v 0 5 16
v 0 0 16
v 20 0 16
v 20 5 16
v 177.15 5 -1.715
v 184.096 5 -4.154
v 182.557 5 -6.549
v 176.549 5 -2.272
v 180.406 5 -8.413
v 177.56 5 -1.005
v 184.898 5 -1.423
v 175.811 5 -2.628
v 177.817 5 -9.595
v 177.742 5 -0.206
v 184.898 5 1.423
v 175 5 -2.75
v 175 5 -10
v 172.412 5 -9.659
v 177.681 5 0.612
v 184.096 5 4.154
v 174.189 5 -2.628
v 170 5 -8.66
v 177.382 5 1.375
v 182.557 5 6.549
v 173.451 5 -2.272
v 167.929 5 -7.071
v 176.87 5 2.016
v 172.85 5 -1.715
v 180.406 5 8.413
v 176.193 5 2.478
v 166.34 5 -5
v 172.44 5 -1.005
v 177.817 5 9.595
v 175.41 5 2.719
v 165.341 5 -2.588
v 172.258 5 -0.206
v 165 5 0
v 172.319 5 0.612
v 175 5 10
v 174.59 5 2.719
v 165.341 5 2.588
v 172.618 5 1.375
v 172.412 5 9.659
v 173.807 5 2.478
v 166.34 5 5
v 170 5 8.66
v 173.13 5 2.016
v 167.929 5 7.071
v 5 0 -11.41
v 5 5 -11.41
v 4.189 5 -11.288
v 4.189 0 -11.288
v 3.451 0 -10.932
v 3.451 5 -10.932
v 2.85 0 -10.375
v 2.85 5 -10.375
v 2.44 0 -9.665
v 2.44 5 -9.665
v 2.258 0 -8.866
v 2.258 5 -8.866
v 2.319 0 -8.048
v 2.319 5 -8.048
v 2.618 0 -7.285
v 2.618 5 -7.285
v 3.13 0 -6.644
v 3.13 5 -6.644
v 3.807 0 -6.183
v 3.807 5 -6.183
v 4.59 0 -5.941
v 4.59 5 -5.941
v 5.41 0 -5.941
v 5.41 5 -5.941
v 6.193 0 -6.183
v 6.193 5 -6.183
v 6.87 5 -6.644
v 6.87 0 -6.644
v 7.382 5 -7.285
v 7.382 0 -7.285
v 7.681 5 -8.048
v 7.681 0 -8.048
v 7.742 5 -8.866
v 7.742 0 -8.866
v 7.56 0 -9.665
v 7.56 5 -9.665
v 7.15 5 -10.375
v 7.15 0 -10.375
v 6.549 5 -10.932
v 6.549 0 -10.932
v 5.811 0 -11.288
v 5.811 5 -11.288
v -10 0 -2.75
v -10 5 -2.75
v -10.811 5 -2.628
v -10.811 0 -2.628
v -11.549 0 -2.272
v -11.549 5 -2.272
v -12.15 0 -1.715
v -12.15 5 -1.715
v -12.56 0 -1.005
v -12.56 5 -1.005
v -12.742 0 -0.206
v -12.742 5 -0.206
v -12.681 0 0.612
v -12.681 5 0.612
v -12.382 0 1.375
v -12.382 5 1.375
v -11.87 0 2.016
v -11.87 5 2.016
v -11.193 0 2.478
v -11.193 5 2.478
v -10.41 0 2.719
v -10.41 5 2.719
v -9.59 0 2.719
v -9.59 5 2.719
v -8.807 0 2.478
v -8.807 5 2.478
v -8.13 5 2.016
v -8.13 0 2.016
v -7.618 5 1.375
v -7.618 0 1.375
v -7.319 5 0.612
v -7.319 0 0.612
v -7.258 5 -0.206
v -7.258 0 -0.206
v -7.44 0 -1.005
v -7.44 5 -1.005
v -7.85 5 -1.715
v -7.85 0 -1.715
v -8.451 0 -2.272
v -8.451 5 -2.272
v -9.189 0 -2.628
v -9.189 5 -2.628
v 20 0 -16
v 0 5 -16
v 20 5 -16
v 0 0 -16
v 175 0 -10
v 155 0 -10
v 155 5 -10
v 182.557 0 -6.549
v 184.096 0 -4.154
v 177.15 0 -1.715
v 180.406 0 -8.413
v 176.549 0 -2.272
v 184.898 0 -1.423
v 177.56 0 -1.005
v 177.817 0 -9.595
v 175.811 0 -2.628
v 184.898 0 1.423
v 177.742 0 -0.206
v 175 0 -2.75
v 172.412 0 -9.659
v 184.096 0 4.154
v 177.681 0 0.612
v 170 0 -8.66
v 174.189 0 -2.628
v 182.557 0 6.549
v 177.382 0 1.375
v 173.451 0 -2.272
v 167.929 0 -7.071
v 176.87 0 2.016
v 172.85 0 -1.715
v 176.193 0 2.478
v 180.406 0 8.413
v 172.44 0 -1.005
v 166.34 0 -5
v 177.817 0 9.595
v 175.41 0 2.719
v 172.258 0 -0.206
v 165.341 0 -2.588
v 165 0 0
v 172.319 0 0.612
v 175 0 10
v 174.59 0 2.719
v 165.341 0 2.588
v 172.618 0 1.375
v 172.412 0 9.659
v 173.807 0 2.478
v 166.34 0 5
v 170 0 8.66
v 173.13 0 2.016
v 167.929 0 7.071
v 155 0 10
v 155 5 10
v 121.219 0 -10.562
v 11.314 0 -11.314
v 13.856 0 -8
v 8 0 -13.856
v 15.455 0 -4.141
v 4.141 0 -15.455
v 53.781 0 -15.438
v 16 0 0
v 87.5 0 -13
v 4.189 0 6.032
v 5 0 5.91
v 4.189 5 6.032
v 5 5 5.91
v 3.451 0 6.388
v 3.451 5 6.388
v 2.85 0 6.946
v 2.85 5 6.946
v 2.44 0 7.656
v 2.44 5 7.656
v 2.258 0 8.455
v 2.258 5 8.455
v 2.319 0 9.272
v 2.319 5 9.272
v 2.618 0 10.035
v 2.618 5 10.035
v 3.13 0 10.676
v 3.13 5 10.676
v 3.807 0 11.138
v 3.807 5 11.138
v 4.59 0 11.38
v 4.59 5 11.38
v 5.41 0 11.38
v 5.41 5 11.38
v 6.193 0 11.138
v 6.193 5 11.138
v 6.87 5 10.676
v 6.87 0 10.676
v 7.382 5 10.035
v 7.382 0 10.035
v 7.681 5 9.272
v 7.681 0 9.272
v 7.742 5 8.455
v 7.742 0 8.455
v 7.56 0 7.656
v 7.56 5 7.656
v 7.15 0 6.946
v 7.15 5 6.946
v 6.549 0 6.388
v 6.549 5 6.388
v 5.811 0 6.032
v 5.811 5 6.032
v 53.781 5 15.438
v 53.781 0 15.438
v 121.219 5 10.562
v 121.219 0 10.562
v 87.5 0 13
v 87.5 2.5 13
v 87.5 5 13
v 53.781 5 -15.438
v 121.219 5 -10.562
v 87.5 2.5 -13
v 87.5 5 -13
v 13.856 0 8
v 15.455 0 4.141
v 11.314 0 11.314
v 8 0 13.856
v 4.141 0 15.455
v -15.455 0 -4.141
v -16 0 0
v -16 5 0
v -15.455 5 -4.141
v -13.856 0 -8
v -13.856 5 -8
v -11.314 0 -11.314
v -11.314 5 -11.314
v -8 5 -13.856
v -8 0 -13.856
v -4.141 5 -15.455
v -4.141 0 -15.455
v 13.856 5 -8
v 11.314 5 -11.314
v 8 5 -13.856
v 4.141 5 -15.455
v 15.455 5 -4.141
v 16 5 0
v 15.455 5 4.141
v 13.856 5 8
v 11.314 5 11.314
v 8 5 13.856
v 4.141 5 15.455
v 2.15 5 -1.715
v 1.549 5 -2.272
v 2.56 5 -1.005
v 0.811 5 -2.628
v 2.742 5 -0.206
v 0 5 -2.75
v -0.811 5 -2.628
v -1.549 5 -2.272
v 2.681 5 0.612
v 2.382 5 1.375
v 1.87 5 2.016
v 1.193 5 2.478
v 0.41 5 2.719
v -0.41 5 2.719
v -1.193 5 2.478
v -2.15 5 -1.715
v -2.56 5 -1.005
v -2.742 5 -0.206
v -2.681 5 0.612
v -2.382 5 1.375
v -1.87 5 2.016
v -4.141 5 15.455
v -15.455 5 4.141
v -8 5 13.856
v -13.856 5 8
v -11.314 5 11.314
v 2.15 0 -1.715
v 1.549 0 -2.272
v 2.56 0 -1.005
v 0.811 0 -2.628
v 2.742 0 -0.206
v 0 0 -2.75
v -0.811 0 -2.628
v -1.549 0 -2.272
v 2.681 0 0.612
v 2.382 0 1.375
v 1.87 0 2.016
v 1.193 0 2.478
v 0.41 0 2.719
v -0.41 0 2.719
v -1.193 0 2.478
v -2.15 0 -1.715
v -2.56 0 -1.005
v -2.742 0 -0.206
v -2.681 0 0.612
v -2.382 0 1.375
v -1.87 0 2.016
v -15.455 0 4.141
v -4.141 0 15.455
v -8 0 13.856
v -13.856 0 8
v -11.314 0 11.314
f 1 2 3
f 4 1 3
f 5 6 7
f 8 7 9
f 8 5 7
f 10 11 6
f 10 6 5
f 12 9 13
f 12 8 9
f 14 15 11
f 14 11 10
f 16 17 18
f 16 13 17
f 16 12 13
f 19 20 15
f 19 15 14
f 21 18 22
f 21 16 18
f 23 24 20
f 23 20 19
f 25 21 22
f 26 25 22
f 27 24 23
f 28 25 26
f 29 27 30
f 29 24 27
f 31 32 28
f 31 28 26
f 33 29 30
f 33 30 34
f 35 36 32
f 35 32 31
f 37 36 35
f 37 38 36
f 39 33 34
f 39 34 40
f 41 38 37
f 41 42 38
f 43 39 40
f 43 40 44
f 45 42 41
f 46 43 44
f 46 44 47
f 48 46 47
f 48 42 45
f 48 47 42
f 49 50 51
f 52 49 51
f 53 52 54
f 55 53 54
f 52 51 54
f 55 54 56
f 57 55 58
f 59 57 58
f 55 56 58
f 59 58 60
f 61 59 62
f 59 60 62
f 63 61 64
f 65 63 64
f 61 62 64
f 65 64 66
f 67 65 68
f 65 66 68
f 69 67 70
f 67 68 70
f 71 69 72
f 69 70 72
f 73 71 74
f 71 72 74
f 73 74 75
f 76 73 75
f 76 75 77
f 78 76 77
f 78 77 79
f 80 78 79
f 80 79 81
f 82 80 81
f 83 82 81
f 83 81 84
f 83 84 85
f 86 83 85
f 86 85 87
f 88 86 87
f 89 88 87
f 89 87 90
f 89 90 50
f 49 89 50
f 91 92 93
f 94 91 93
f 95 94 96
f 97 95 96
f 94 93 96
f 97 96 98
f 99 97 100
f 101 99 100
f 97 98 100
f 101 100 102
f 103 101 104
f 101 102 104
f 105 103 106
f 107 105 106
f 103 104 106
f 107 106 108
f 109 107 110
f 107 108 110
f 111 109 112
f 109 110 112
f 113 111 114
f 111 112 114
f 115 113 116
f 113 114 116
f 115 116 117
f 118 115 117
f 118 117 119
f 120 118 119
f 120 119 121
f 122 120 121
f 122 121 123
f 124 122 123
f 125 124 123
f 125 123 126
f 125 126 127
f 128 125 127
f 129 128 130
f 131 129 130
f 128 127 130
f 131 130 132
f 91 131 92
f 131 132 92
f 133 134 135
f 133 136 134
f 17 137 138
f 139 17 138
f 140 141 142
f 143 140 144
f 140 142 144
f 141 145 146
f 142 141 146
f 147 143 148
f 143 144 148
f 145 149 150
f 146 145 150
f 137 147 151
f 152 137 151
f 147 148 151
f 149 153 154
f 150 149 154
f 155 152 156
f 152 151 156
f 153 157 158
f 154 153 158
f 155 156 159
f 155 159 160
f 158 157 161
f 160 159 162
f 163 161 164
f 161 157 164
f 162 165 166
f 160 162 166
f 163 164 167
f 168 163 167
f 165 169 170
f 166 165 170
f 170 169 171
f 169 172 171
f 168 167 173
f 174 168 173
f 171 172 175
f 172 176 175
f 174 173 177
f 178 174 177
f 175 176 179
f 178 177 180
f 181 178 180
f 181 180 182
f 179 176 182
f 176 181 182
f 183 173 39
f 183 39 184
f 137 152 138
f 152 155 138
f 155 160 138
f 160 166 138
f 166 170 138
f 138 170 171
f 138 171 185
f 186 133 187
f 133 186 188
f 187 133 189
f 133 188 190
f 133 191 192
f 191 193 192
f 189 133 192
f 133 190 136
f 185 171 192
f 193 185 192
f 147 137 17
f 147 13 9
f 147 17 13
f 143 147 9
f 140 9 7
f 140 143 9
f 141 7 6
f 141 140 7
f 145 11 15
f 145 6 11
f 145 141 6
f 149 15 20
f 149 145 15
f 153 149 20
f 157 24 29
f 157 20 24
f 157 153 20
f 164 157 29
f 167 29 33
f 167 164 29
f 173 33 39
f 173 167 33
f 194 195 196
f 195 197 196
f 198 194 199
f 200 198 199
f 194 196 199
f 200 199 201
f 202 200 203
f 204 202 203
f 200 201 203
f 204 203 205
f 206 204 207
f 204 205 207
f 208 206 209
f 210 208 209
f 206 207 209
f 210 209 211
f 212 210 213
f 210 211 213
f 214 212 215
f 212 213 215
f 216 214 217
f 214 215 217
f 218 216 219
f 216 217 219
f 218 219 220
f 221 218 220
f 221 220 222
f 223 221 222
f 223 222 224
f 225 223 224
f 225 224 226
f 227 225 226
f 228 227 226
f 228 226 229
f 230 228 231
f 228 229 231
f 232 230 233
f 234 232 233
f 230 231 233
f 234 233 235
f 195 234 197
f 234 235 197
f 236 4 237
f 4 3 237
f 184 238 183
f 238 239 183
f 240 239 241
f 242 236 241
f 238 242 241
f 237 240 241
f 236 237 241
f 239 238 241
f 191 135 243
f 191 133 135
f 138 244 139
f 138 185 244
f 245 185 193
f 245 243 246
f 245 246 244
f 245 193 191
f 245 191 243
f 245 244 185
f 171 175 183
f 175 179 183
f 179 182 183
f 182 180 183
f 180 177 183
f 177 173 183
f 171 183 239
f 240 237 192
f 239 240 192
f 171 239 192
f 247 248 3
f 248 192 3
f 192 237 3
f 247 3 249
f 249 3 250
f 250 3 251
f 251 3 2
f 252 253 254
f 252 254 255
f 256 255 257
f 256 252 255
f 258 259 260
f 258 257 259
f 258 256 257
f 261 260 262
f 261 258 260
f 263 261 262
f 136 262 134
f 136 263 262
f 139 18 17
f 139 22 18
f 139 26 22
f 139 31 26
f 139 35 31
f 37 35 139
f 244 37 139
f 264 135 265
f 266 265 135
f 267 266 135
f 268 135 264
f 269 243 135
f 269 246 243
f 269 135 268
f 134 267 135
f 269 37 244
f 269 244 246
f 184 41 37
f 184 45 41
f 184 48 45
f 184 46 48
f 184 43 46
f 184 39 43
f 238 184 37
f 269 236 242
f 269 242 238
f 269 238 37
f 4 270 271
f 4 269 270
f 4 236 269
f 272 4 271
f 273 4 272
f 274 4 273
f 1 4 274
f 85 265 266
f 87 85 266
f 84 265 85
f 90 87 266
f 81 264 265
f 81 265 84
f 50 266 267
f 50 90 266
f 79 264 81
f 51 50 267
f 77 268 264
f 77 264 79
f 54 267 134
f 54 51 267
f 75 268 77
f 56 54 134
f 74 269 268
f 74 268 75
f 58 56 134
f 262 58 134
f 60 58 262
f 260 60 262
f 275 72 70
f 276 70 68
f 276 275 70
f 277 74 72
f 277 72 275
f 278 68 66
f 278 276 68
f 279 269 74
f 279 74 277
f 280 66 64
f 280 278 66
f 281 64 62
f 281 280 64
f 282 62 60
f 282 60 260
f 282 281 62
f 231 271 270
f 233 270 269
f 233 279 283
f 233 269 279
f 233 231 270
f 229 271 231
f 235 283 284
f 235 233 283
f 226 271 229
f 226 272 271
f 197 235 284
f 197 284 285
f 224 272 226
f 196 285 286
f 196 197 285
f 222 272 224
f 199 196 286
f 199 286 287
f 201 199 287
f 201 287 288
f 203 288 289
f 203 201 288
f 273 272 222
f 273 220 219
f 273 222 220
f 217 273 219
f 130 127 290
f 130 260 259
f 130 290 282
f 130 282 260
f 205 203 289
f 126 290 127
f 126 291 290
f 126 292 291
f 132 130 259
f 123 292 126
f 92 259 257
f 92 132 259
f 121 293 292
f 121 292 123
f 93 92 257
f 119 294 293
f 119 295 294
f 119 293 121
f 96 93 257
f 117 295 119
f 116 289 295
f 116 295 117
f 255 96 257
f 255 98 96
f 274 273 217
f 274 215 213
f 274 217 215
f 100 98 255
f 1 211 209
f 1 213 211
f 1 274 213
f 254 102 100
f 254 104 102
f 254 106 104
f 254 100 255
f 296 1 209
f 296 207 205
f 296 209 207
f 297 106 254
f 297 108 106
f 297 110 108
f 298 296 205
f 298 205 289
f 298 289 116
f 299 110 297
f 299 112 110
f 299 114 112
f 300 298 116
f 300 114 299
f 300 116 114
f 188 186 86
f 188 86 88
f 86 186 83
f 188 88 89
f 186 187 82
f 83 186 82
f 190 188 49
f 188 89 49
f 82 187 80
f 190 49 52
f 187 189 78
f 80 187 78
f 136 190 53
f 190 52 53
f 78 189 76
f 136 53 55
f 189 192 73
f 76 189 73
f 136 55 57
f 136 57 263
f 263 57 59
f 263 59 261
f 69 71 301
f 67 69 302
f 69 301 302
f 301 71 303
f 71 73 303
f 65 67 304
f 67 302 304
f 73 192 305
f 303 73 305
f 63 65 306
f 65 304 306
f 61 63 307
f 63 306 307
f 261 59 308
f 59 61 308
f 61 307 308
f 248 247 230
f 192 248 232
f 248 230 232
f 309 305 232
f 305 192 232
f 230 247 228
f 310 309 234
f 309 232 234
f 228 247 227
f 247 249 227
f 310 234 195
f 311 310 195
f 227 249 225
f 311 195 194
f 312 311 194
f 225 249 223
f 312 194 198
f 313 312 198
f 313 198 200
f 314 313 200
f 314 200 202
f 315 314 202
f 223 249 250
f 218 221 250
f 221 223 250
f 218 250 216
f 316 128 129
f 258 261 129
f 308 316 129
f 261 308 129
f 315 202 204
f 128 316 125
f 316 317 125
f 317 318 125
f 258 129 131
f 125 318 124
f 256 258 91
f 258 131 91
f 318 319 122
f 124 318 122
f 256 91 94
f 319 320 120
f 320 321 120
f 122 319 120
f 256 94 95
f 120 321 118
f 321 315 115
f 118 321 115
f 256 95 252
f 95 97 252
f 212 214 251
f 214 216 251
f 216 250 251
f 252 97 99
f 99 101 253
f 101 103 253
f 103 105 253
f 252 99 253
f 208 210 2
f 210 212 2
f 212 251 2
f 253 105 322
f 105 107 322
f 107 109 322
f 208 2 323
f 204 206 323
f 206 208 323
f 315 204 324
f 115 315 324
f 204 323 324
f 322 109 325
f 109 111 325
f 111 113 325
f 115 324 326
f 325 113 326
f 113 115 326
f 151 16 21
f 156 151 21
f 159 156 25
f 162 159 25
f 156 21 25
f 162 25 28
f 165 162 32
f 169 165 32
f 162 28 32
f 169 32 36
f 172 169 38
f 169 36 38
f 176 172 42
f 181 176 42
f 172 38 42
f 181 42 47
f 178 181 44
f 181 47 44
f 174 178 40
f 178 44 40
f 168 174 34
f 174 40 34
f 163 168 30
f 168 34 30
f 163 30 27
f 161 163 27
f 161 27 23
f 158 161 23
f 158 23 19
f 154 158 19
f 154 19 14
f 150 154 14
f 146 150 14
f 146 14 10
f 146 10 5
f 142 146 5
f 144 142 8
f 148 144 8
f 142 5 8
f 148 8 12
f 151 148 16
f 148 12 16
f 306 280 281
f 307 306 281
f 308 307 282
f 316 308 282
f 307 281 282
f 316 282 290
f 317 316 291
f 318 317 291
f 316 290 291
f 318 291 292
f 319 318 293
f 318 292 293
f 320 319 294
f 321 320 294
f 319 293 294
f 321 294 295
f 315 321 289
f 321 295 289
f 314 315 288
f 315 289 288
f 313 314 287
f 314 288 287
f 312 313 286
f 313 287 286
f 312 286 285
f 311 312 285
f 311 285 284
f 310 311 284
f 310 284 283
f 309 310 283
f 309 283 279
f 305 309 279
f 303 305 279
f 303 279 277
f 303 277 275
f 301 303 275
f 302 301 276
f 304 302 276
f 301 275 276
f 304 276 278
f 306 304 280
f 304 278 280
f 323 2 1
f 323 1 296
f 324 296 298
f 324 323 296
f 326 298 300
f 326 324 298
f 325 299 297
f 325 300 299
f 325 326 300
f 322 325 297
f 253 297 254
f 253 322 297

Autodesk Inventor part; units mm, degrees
ref_plane "YZ Plane" through (0, 0, 0) normal (1, 0, 0) x (0, 1, 0)
ref_plane "XZ Plane" through (0, 0, 0) normal (0, 1, 0) x (-1, 0, 0)
ref_plane "XY Plane" through (0, 0, 0) normal (0, 0, 1) x (1, 0, 0)
sketch "Sketch2" plane through (0, 0, 0) normal (0, 1, 0) x (-1, 0, 0)
  circle A0 centre (0, 0) radius 16
  circle A1 centre (-175, 0) radius 10
  line L0 (0, 0) -> (-175, 0)
  line L1 (0, 16) -> (-20, 16)
  line L2 (-175, 10) -> (-155, 10)
  spline S0 degree 4 poles (-20, 16) (-36.9, 16) (-70.7, 16) (-104.3, 10) (-138.1, 10) (-155, 10) knots 0 0 0 0 0 0.5 1 1 1 1 1
  line L3 (0, 0) -> (0, 16) construction
  line L4 (-175, 0) -> (-175, 10) construction
  line L5 (0, -16) -> (-20, -16)
  line L6 (-175, -10) -> (-155, -10)
  spline S1 degree 4 poles (-20, -16) (-36.9, -16) (-70.7, -16) (-104.3, -10) (-138.1, -10) (-155, -10) knots 0 0 0 0 0 0.5 1 1 1 1 1
  line L7 (0, 0) -> (10, 0) construction
  point P0 (0, -16)
  point P1 (-5, 8.6603)
  point P2 (-5, -8.6603)
  dimension "d0" = 32
  dimension "d1" = 20
  dimension "d2" = 175
  dimension "d3" = 20
  dimension "d4" = 20
  dimension "d26" = 10
  dimension "d29" = 360
extrude "Extrusion1" add sketch "Sketch2" along normal blind 5
hole "Hole1" at (-10, 0, 0) at (5, 0, 8.6603) at (5, 0, -8.6603) direction (0, 1, 0) diameter 5.5 end through all clearance for "Socket Head Cap Screw" size "M5" standard "Ansi Metric M Profile"
hole "Hole2" at (175, 0, 0) at (0, 0, 0) direction (0, 1, 0) diameter 5.5 end through all clearance for "Socket Head Cap Screw" size "M5" standard "Ansi Metric M Profile"
properties part number "RT_ARM_MC_002" material "CFRP"
